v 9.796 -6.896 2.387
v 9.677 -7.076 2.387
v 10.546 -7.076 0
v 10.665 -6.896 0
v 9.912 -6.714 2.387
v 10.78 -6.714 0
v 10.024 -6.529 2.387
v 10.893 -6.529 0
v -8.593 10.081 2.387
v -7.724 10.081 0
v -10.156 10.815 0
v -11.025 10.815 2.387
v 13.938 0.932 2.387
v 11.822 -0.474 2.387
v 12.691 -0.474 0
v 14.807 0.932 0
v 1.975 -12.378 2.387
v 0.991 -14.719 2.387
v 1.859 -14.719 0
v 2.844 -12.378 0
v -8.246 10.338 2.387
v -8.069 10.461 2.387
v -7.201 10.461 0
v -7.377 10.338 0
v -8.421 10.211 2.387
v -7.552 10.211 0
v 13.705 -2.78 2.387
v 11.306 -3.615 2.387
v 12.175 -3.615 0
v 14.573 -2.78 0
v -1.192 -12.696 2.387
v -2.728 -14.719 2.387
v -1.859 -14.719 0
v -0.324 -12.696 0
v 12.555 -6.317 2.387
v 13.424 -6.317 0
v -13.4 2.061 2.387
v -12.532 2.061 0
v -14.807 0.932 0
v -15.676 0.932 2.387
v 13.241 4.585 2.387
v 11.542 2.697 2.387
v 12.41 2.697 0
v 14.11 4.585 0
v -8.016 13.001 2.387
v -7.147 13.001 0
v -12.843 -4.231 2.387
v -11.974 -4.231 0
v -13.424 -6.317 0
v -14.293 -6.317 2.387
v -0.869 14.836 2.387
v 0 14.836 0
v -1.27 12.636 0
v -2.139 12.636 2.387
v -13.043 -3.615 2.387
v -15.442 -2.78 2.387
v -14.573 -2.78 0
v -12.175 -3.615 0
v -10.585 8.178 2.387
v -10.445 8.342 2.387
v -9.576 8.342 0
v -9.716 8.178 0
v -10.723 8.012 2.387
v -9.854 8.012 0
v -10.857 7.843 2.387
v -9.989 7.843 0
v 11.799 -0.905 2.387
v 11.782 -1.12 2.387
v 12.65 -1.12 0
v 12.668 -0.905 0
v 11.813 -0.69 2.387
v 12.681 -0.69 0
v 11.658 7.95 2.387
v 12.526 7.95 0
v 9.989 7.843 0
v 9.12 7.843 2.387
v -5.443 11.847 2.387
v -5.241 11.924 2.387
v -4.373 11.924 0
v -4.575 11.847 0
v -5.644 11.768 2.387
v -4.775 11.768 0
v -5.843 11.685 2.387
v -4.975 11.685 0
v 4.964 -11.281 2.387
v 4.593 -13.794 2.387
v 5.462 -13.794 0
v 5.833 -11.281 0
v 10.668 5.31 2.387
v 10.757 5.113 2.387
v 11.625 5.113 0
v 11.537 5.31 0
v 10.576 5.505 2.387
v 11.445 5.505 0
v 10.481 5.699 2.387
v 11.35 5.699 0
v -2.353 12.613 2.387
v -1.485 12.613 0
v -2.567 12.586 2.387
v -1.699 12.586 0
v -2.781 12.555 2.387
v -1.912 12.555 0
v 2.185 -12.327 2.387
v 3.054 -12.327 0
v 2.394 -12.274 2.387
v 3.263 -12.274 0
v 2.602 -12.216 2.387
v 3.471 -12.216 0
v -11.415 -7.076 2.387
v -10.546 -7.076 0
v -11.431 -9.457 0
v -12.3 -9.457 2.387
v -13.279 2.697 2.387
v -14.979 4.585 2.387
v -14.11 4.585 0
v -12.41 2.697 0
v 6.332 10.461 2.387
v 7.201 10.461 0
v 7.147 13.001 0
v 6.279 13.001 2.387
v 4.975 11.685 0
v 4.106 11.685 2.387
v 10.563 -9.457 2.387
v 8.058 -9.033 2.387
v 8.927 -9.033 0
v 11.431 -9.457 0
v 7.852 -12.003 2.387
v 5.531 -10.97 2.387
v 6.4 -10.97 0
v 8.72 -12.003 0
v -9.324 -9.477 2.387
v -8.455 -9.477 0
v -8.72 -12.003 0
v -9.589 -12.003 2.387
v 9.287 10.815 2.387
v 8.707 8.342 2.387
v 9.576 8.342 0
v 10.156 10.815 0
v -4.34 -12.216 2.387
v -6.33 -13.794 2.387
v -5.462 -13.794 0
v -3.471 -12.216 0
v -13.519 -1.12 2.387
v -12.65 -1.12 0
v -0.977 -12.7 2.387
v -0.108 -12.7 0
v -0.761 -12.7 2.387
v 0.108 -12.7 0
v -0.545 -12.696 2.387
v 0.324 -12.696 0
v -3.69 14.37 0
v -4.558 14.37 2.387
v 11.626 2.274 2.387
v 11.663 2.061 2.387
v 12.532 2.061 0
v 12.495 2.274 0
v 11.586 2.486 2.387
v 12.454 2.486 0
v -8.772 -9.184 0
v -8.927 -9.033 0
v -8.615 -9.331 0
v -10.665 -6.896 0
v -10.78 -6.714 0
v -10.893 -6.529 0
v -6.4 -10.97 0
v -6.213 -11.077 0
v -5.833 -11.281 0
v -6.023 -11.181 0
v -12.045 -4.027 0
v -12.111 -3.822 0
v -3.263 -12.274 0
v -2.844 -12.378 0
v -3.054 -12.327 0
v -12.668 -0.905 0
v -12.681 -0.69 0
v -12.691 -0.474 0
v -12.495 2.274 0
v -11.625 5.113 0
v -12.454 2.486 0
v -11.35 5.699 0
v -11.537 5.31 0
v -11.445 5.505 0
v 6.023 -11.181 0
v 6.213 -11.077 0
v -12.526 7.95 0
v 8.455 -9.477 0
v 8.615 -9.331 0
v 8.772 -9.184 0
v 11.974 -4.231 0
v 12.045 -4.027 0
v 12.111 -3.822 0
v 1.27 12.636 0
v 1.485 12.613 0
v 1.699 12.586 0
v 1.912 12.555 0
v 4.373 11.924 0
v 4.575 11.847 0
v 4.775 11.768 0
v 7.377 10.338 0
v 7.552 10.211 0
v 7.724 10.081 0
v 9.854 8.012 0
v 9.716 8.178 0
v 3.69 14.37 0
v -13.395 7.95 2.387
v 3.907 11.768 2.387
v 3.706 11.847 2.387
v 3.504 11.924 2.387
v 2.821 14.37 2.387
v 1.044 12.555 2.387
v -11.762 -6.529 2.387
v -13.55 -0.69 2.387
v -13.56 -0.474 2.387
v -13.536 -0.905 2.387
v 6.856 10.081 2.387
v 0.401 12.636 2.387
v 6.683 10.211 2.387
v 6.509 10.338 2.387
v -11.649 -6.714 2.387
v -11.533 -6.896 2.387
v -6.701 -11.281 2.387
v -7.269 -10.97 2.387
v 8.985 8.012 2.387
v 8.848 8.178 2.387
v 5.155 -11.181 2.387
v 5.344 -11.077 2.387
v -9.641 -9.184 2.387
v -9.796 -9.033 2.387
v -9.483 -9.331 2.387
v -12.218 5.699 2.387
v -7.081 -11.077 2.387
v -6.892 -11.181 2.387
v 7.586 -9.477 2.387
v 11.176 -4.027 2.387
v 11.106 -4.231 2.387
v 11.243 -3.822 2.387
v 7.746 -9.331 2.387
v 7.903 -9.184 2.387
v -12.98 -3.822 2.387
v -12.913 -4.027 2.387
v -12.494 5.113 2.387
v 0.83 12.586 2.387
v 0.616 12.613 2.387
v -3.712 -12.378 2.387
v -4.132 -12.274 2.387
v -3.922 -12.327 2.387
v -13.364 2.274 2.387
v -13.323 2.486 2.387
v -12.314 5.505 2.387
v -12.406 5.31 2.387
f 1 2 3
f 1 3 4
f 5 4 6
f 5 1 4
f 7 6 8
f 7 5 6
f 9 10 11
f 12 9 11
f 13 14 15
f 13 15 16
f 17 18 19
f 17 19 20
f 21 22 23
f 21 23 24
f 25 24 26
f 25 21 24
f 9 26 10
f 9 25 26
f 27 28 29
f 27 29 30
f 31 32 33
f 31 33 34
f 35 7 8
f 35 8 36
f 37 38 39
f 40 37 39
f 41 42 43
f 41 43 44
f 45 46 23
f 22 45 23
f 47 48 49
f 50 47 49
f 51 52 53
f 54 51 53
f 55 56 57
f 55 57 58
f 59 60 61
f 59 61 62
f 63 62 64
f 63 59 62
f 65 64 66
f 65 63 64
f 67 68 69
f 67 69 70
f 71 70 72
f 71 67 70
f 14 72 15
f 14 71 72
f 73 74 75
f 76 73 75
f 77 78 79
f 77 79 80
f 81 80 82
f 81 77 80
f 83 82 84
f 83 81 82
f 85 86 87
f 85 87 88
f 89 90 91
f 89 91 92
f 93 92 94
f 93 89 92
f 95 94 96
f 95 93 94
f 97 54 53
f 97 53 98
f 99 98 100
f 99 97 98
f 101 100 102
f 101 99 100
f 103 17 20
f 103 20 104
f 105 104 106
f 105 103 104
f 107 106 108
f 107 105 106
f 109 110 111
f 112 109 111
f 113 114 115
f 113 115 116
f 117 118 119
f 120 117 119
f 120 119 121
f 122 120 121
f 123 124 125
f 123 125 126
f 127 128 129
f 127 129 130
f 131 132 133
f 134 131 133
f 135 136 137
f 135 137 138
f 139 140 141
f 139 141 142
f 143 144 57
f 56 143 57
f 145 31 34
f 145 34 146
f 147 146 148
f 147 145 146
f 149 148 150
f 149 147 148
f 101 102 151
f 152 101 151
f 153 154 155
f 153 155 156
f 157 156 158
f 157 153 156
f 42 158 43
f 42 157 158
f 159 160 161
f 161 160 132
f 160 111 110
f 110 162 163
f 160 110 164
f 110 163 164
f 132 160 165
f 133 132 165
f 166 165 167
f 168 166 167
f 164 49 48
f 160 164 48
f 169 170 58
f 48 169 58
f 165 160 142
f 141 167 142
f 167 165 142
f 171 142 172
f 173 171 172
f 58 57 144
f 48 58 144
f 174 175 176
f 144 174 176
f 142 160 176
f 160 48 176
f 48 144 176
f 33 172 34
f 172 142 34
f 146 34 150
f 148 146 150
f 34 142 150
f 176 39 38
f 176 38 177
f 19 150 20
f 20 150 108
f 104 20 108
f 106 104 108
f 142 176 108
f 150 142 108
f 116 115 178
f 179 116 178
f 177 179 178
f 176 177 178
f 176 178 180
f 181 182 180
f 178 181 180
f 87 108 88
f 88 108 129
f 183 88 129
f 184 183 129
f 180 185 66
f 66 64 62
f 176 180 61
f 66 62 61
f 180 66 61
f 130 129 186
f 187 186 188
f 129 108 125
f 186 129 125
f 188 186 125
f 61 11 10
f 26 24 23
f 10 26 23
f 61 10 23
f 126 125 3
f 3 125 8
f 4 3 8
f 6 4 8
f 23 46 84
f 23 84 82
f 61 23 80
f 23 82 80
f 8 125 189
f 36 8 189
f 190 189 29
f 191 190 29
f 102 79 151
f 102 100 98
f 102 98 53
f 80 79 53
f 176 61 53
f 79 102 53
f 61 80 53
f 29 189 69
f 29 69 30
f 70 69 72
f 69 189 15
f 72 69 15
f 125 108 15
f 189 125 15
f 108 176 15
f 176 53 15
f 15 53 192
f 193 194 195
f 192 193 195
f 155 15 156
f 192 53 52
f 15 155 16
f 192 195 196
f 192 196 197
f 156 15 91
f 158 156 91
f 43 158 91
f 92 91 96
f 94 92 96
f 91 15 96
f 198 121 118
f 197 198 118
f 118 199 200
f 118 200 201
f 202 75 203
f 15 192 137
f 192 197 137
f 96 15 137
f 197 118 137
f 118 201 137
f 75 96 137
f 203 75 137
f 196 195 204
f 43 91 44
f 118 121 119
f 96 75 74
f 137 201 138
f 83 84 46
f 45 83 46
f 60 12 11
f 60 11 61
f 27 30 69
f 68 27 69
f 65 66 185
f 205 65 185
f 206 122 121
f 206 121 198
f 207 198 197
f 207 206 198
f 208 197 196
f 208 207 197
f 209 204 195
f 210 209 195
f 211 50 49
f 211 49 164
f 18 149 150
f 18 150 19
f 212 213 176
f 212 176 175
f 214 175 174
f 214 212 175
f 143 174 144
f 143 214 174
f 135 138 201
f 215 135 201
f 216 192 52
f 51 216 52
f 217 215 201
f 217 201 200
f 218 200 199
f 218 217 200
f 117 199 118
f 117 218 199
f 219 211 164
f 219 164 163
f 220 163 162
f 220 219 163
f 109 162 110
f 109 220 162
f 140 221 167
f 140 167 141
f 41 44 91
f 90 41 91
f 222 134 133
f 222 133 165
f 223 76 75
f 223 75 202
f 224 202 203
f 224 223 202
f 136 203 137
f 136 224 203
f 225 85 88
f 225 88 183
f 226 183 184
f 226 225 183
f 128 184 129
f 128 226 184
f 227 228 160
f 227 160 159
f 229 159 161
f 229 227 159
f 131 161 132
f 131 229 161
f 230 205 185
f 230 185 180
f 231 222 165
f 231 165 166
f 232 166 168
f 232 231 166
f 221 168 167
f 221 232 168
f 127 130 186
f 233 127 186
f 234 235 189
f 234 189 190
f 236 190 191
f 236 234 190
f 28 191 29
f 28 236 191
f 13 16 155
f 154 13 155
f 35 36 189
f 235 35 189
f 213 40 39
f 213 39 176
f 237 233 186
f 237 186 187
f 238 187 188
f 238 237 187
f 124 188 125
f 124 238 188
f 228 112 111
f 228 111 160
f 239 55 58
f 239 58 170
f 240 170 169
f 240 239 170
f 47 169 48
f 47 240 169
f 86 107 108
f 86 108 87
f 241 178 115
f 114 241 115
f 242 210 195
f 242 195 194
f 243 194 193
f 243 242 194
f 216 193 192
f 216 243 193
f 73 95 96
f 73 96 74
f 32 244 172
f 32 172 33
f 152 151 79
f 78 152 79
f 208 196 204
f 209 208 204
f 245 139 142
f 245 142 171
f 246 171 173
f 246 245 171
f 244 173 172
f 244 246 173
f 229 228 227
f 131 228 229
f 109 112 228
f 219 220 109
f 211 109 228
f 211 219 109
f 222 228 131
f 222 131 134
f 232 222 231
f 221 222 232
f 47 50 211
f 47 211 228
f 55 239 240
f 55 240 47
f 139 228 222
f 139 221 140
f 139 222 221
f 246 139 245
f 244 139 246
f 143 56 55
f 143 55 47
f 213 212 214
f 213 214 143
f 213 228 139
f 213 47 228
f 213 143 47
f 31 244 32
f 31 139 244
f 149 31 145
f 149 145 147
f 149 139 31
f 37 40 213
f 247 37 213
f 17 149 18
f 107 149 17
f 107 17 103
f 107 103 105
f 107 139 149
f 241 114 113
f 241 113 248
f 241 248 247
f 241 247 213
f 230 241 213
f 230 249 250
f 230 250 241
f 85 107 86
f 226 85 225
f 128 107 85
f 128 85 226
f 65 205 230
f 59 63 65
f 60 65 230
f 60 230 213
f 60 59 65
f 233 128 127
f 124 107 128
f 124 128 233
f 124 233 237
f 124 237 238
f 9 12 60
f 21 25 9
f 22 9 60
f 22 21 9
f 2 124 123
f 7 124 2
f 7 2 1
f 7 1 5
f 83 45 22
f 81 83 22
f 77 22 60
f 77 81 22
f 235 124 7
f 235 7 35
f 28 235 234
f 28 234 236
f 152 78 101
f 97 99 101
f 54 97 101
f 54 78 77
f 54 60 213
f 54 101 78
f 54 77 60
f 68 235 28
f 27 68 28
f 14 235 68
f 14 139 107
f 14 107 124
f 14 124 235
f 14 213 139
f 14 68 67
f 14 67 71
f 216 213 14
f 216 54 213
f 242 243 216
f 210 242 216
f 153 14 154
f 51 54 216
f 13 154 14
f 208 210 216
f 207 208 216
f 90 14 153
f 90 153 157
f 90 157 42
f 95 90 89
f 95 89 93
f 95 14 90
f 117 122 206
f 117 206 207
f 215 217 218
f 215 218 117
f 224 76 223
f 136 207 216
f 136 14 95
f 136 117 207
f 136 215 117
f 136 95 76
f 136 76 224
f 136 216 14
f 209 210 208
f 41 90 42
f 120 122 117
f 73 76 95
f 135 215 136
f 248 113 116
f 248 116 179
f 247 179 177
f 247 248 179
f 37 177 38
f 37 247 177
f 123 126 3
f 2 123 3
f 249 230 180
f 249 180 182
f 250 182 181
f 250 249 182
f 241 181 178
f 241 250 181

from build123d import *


with BuildPart() as f2:
    # F2: sweep along a path in F1
    with BuildLine(Plane.XZ) as f2_path:
        Line((0, 0), (-0.868731, 2.386819))
    # F0 (on Top) → F2 (sweep)
    with BuildSketch(Plane.XY):
        with BuildLine():
            Line((0, 14.836045), (-1.27, 12.63634))
            ThreePointArc((-1.27, 12.63634), (-1.591732, 12.599857), (-1.912429, 12.555183))
            Line((-1.912429, 12.555183), (-3.689574, 14.369943))
            Line((-3.689574, 14.369943), (-4.372631, 11.92351))
            ThreePointArc((-4.372631, 11.92351), (-4.675182, 11.808161), (-4.974694, 11.685137))
            Line((-4.974694, 11.685137), (-7.147319, 13.000925))
            Line((-7.147319, 13.000925), (-7.200513, 10.461482))
            ThreePointArc((-7.200513, 10.461482), (-7.464873, 10.274516), (-7.72438, 10.080871))
            Line((-7.72438, 10.080871), (-10.155972, 10.815011))
            Line((-10.155972, 10.815011), (-9.57596, 8.342121))
            ThreePointArc((-9.57596, 8.342121), (-9.785518, 8.095285), (-9.988715, 7.843186))
            Line((-9.988715, 7.843186), (-12.526487, 7.94955))
            Line((-12.526487, 7.94955), (-11.349715, 5.698593))
            ThreePointArc((-11.349715, 5.698593), (-11.491304, 5.407397), (-11.625422, 5.112686))
            Line((-11.625422, 5.112686), (-14.109917, 4.58459))
            Line((-14.109917, 4.58459), (-12.410326, 2.697002))
            ThreePointArc((-12.410326, 2.697002), (-12.475048, 2.379743), (-12.531662, 2.060936))
            Line((-12.531662, 2.060936), (-14.806769, 0.931563))
            Line((-14.806769, 0.931563), (-12.691149, -0.474052))
            ThreePointArc((-12.691149, -0.474052), (-12.674939, -0.79744), (-12.65049, -1.120309))
            Line((-12.65049, -1.120309), (-14.573258, -2.779998))
            Line((-14.573258, -2.779998), (-12.174542, -3.615319))
            ThreePointArc((-12.174542, -3.615319), (-12.078418, -3.924516), (-11.974442, -4.231162))
            Line((-11.974442, -4.231162), (-13.424055, -6.316881))
            Line((-13.424055, -6.316881), (-10.892963, -6.529422))
            ThreePointArc((-10.892963, -6.529422), (-10.722965, -6.805), (-10.545996, -7.076155))
            Line((-10.545996, -7.076155), (-11.431369, -9.456851))
            Line((-11.431369, -9.456851), (-8.926939, -9.033258))
            ThreePointArc((-8.926939, -9.033258), (-8.693748, -9.257902), (-8.454906, -9.476527))
            Line((-8.454906, -9.476527), (-8.720408, -12.002613))
            Line((-8.720408, -12.002613), (-6.400003, -10.969501))
            ThreePointArc((-6.400003, -10.969501), (-6.118272, -11.129095), (-5.832563, -11.281454))
            Line((-5.832563, -11.281454), (-5.461512, -13.794206))
            Line((-5.461512, -13.794206), (-3.470931, -12.21649))
            ThreePointArc((-3.470931, -12.21649), (-3.158362, -12.301006), (-2.843739, -12.377526))
            Line((-2.843739, -12.377526), (-1.859449, -14.719058))
            Line((-1.859449, -14.719058), (-0.323768, -12.695872))
            ThreePointArc((-0.323768, -12.695872), (0, -12.7), (0.323768, -12.695872))
            Line((0.323768, -12.695872), (1.859449, -14.719058))
            Line((1.859449, -14.719058), (2.843739, -12.377526))
            ThreePointArc((2.843739, -12.377526), (3.158362, -12.301006), (3.470931, -12.21649))
            Line((3.470931, -12.21649), (5.461512, -13.794206))
            Line((5.461512, -13.794206), (5.832563, -11.281454))
            ThreePointArc((5.832563, -11.281454), (6.118272, -11.129095), (6.400003, -10.969501))
            Line((6.400003, -10.969501), (8.720408, -12.002613))
            Line((8.720408, -12.002613), (8.454906, -9.476527))
            ThreePointArc((8.454906, -9.476527), (8.693748, -9.257902), (8.926939, -9.033258))
            Line((8.926939, -9.033258), (11.431369, -9.456851))
            Line((11.431369, -9.456851), (10.545996, -7.076155))
            ThreePointArc((10.545996, -7.076155), (10.722965, -6.805), (10.892963, -6.529422))
            Line((10.892963, -6.529422), (13.424055, -6.316881))
            Line((13.424055, -6.316881), (11.974442, -4.231162))
            ThreePointArc((11.974442, -4.231162), (12.078418, -3.924516), (12.174542, -3.615319))
            Line((12.174542, -3.615319), (14.573258, -2.779998))
            Line((14.573258, -2.779998), (12.65049, -1.120309))
            ThreePointArc((12.65049, -1.120309), (12.674939, -0.79744), (12.691149, -0.474052))
            Line((12.691149, -0.474052), (14.806769, 0.931563))
            Line((14.806769, 0.931563), (12.531662, 2.060936))
            ThreePointArc((12.531662, 2.060936), (12.475048, 2.379743), (12.410326, 2.697002))
            Line((12.410326, 2.697002), (14.109917, 4.58459))
            Line((14.109917, 4.58459), (11.625422, 5.112686))
            ThreePointArc((11.625422, 5.112686), (11.491304, 5.407397), (11.349715, 5.698593))
            Line((11.349715, 5.698593), (12.526487, 7.94955))
            Line((12.526487, 7.94955), (9.988715, 7.843186))
            ThreePointArc((9.988715, 7.843186), (9.785518, 8.095285), (9.57596, 8.342121))
            Line((9.57596, 8.342121), (10.155972, 10.815011))
            Line((10.155972, 10.815011), (7.72438, 10.080871))
            ThreePointArc((7.72438, 10.080871), (7.464873, 10.274516), (7.200513, 10.461482))
            Line((7.200513, 10.461482), (7.147319, 13.000925))
            Line((7.147319, 13.000925), (4.974694, 11.685137))
            ThreePointArc((4.974694, 11.685137), (4.675182, 11.808161), (4.372631, 11.92351))
            Line((4.372631, 11.92351), (3.689574, 14.369943))
            Line((3.689574, 14.369943), (1.912429, 12.555183))
            ThreePointArc((1.912429, 12.555183), (1.591732, 12.599857), (1.27, 12.63634))
            Line((1.27, 12.63634), (0, 14.836045))
        make_face()
    sweep(path=f2_path.line)


solid = f2.part
